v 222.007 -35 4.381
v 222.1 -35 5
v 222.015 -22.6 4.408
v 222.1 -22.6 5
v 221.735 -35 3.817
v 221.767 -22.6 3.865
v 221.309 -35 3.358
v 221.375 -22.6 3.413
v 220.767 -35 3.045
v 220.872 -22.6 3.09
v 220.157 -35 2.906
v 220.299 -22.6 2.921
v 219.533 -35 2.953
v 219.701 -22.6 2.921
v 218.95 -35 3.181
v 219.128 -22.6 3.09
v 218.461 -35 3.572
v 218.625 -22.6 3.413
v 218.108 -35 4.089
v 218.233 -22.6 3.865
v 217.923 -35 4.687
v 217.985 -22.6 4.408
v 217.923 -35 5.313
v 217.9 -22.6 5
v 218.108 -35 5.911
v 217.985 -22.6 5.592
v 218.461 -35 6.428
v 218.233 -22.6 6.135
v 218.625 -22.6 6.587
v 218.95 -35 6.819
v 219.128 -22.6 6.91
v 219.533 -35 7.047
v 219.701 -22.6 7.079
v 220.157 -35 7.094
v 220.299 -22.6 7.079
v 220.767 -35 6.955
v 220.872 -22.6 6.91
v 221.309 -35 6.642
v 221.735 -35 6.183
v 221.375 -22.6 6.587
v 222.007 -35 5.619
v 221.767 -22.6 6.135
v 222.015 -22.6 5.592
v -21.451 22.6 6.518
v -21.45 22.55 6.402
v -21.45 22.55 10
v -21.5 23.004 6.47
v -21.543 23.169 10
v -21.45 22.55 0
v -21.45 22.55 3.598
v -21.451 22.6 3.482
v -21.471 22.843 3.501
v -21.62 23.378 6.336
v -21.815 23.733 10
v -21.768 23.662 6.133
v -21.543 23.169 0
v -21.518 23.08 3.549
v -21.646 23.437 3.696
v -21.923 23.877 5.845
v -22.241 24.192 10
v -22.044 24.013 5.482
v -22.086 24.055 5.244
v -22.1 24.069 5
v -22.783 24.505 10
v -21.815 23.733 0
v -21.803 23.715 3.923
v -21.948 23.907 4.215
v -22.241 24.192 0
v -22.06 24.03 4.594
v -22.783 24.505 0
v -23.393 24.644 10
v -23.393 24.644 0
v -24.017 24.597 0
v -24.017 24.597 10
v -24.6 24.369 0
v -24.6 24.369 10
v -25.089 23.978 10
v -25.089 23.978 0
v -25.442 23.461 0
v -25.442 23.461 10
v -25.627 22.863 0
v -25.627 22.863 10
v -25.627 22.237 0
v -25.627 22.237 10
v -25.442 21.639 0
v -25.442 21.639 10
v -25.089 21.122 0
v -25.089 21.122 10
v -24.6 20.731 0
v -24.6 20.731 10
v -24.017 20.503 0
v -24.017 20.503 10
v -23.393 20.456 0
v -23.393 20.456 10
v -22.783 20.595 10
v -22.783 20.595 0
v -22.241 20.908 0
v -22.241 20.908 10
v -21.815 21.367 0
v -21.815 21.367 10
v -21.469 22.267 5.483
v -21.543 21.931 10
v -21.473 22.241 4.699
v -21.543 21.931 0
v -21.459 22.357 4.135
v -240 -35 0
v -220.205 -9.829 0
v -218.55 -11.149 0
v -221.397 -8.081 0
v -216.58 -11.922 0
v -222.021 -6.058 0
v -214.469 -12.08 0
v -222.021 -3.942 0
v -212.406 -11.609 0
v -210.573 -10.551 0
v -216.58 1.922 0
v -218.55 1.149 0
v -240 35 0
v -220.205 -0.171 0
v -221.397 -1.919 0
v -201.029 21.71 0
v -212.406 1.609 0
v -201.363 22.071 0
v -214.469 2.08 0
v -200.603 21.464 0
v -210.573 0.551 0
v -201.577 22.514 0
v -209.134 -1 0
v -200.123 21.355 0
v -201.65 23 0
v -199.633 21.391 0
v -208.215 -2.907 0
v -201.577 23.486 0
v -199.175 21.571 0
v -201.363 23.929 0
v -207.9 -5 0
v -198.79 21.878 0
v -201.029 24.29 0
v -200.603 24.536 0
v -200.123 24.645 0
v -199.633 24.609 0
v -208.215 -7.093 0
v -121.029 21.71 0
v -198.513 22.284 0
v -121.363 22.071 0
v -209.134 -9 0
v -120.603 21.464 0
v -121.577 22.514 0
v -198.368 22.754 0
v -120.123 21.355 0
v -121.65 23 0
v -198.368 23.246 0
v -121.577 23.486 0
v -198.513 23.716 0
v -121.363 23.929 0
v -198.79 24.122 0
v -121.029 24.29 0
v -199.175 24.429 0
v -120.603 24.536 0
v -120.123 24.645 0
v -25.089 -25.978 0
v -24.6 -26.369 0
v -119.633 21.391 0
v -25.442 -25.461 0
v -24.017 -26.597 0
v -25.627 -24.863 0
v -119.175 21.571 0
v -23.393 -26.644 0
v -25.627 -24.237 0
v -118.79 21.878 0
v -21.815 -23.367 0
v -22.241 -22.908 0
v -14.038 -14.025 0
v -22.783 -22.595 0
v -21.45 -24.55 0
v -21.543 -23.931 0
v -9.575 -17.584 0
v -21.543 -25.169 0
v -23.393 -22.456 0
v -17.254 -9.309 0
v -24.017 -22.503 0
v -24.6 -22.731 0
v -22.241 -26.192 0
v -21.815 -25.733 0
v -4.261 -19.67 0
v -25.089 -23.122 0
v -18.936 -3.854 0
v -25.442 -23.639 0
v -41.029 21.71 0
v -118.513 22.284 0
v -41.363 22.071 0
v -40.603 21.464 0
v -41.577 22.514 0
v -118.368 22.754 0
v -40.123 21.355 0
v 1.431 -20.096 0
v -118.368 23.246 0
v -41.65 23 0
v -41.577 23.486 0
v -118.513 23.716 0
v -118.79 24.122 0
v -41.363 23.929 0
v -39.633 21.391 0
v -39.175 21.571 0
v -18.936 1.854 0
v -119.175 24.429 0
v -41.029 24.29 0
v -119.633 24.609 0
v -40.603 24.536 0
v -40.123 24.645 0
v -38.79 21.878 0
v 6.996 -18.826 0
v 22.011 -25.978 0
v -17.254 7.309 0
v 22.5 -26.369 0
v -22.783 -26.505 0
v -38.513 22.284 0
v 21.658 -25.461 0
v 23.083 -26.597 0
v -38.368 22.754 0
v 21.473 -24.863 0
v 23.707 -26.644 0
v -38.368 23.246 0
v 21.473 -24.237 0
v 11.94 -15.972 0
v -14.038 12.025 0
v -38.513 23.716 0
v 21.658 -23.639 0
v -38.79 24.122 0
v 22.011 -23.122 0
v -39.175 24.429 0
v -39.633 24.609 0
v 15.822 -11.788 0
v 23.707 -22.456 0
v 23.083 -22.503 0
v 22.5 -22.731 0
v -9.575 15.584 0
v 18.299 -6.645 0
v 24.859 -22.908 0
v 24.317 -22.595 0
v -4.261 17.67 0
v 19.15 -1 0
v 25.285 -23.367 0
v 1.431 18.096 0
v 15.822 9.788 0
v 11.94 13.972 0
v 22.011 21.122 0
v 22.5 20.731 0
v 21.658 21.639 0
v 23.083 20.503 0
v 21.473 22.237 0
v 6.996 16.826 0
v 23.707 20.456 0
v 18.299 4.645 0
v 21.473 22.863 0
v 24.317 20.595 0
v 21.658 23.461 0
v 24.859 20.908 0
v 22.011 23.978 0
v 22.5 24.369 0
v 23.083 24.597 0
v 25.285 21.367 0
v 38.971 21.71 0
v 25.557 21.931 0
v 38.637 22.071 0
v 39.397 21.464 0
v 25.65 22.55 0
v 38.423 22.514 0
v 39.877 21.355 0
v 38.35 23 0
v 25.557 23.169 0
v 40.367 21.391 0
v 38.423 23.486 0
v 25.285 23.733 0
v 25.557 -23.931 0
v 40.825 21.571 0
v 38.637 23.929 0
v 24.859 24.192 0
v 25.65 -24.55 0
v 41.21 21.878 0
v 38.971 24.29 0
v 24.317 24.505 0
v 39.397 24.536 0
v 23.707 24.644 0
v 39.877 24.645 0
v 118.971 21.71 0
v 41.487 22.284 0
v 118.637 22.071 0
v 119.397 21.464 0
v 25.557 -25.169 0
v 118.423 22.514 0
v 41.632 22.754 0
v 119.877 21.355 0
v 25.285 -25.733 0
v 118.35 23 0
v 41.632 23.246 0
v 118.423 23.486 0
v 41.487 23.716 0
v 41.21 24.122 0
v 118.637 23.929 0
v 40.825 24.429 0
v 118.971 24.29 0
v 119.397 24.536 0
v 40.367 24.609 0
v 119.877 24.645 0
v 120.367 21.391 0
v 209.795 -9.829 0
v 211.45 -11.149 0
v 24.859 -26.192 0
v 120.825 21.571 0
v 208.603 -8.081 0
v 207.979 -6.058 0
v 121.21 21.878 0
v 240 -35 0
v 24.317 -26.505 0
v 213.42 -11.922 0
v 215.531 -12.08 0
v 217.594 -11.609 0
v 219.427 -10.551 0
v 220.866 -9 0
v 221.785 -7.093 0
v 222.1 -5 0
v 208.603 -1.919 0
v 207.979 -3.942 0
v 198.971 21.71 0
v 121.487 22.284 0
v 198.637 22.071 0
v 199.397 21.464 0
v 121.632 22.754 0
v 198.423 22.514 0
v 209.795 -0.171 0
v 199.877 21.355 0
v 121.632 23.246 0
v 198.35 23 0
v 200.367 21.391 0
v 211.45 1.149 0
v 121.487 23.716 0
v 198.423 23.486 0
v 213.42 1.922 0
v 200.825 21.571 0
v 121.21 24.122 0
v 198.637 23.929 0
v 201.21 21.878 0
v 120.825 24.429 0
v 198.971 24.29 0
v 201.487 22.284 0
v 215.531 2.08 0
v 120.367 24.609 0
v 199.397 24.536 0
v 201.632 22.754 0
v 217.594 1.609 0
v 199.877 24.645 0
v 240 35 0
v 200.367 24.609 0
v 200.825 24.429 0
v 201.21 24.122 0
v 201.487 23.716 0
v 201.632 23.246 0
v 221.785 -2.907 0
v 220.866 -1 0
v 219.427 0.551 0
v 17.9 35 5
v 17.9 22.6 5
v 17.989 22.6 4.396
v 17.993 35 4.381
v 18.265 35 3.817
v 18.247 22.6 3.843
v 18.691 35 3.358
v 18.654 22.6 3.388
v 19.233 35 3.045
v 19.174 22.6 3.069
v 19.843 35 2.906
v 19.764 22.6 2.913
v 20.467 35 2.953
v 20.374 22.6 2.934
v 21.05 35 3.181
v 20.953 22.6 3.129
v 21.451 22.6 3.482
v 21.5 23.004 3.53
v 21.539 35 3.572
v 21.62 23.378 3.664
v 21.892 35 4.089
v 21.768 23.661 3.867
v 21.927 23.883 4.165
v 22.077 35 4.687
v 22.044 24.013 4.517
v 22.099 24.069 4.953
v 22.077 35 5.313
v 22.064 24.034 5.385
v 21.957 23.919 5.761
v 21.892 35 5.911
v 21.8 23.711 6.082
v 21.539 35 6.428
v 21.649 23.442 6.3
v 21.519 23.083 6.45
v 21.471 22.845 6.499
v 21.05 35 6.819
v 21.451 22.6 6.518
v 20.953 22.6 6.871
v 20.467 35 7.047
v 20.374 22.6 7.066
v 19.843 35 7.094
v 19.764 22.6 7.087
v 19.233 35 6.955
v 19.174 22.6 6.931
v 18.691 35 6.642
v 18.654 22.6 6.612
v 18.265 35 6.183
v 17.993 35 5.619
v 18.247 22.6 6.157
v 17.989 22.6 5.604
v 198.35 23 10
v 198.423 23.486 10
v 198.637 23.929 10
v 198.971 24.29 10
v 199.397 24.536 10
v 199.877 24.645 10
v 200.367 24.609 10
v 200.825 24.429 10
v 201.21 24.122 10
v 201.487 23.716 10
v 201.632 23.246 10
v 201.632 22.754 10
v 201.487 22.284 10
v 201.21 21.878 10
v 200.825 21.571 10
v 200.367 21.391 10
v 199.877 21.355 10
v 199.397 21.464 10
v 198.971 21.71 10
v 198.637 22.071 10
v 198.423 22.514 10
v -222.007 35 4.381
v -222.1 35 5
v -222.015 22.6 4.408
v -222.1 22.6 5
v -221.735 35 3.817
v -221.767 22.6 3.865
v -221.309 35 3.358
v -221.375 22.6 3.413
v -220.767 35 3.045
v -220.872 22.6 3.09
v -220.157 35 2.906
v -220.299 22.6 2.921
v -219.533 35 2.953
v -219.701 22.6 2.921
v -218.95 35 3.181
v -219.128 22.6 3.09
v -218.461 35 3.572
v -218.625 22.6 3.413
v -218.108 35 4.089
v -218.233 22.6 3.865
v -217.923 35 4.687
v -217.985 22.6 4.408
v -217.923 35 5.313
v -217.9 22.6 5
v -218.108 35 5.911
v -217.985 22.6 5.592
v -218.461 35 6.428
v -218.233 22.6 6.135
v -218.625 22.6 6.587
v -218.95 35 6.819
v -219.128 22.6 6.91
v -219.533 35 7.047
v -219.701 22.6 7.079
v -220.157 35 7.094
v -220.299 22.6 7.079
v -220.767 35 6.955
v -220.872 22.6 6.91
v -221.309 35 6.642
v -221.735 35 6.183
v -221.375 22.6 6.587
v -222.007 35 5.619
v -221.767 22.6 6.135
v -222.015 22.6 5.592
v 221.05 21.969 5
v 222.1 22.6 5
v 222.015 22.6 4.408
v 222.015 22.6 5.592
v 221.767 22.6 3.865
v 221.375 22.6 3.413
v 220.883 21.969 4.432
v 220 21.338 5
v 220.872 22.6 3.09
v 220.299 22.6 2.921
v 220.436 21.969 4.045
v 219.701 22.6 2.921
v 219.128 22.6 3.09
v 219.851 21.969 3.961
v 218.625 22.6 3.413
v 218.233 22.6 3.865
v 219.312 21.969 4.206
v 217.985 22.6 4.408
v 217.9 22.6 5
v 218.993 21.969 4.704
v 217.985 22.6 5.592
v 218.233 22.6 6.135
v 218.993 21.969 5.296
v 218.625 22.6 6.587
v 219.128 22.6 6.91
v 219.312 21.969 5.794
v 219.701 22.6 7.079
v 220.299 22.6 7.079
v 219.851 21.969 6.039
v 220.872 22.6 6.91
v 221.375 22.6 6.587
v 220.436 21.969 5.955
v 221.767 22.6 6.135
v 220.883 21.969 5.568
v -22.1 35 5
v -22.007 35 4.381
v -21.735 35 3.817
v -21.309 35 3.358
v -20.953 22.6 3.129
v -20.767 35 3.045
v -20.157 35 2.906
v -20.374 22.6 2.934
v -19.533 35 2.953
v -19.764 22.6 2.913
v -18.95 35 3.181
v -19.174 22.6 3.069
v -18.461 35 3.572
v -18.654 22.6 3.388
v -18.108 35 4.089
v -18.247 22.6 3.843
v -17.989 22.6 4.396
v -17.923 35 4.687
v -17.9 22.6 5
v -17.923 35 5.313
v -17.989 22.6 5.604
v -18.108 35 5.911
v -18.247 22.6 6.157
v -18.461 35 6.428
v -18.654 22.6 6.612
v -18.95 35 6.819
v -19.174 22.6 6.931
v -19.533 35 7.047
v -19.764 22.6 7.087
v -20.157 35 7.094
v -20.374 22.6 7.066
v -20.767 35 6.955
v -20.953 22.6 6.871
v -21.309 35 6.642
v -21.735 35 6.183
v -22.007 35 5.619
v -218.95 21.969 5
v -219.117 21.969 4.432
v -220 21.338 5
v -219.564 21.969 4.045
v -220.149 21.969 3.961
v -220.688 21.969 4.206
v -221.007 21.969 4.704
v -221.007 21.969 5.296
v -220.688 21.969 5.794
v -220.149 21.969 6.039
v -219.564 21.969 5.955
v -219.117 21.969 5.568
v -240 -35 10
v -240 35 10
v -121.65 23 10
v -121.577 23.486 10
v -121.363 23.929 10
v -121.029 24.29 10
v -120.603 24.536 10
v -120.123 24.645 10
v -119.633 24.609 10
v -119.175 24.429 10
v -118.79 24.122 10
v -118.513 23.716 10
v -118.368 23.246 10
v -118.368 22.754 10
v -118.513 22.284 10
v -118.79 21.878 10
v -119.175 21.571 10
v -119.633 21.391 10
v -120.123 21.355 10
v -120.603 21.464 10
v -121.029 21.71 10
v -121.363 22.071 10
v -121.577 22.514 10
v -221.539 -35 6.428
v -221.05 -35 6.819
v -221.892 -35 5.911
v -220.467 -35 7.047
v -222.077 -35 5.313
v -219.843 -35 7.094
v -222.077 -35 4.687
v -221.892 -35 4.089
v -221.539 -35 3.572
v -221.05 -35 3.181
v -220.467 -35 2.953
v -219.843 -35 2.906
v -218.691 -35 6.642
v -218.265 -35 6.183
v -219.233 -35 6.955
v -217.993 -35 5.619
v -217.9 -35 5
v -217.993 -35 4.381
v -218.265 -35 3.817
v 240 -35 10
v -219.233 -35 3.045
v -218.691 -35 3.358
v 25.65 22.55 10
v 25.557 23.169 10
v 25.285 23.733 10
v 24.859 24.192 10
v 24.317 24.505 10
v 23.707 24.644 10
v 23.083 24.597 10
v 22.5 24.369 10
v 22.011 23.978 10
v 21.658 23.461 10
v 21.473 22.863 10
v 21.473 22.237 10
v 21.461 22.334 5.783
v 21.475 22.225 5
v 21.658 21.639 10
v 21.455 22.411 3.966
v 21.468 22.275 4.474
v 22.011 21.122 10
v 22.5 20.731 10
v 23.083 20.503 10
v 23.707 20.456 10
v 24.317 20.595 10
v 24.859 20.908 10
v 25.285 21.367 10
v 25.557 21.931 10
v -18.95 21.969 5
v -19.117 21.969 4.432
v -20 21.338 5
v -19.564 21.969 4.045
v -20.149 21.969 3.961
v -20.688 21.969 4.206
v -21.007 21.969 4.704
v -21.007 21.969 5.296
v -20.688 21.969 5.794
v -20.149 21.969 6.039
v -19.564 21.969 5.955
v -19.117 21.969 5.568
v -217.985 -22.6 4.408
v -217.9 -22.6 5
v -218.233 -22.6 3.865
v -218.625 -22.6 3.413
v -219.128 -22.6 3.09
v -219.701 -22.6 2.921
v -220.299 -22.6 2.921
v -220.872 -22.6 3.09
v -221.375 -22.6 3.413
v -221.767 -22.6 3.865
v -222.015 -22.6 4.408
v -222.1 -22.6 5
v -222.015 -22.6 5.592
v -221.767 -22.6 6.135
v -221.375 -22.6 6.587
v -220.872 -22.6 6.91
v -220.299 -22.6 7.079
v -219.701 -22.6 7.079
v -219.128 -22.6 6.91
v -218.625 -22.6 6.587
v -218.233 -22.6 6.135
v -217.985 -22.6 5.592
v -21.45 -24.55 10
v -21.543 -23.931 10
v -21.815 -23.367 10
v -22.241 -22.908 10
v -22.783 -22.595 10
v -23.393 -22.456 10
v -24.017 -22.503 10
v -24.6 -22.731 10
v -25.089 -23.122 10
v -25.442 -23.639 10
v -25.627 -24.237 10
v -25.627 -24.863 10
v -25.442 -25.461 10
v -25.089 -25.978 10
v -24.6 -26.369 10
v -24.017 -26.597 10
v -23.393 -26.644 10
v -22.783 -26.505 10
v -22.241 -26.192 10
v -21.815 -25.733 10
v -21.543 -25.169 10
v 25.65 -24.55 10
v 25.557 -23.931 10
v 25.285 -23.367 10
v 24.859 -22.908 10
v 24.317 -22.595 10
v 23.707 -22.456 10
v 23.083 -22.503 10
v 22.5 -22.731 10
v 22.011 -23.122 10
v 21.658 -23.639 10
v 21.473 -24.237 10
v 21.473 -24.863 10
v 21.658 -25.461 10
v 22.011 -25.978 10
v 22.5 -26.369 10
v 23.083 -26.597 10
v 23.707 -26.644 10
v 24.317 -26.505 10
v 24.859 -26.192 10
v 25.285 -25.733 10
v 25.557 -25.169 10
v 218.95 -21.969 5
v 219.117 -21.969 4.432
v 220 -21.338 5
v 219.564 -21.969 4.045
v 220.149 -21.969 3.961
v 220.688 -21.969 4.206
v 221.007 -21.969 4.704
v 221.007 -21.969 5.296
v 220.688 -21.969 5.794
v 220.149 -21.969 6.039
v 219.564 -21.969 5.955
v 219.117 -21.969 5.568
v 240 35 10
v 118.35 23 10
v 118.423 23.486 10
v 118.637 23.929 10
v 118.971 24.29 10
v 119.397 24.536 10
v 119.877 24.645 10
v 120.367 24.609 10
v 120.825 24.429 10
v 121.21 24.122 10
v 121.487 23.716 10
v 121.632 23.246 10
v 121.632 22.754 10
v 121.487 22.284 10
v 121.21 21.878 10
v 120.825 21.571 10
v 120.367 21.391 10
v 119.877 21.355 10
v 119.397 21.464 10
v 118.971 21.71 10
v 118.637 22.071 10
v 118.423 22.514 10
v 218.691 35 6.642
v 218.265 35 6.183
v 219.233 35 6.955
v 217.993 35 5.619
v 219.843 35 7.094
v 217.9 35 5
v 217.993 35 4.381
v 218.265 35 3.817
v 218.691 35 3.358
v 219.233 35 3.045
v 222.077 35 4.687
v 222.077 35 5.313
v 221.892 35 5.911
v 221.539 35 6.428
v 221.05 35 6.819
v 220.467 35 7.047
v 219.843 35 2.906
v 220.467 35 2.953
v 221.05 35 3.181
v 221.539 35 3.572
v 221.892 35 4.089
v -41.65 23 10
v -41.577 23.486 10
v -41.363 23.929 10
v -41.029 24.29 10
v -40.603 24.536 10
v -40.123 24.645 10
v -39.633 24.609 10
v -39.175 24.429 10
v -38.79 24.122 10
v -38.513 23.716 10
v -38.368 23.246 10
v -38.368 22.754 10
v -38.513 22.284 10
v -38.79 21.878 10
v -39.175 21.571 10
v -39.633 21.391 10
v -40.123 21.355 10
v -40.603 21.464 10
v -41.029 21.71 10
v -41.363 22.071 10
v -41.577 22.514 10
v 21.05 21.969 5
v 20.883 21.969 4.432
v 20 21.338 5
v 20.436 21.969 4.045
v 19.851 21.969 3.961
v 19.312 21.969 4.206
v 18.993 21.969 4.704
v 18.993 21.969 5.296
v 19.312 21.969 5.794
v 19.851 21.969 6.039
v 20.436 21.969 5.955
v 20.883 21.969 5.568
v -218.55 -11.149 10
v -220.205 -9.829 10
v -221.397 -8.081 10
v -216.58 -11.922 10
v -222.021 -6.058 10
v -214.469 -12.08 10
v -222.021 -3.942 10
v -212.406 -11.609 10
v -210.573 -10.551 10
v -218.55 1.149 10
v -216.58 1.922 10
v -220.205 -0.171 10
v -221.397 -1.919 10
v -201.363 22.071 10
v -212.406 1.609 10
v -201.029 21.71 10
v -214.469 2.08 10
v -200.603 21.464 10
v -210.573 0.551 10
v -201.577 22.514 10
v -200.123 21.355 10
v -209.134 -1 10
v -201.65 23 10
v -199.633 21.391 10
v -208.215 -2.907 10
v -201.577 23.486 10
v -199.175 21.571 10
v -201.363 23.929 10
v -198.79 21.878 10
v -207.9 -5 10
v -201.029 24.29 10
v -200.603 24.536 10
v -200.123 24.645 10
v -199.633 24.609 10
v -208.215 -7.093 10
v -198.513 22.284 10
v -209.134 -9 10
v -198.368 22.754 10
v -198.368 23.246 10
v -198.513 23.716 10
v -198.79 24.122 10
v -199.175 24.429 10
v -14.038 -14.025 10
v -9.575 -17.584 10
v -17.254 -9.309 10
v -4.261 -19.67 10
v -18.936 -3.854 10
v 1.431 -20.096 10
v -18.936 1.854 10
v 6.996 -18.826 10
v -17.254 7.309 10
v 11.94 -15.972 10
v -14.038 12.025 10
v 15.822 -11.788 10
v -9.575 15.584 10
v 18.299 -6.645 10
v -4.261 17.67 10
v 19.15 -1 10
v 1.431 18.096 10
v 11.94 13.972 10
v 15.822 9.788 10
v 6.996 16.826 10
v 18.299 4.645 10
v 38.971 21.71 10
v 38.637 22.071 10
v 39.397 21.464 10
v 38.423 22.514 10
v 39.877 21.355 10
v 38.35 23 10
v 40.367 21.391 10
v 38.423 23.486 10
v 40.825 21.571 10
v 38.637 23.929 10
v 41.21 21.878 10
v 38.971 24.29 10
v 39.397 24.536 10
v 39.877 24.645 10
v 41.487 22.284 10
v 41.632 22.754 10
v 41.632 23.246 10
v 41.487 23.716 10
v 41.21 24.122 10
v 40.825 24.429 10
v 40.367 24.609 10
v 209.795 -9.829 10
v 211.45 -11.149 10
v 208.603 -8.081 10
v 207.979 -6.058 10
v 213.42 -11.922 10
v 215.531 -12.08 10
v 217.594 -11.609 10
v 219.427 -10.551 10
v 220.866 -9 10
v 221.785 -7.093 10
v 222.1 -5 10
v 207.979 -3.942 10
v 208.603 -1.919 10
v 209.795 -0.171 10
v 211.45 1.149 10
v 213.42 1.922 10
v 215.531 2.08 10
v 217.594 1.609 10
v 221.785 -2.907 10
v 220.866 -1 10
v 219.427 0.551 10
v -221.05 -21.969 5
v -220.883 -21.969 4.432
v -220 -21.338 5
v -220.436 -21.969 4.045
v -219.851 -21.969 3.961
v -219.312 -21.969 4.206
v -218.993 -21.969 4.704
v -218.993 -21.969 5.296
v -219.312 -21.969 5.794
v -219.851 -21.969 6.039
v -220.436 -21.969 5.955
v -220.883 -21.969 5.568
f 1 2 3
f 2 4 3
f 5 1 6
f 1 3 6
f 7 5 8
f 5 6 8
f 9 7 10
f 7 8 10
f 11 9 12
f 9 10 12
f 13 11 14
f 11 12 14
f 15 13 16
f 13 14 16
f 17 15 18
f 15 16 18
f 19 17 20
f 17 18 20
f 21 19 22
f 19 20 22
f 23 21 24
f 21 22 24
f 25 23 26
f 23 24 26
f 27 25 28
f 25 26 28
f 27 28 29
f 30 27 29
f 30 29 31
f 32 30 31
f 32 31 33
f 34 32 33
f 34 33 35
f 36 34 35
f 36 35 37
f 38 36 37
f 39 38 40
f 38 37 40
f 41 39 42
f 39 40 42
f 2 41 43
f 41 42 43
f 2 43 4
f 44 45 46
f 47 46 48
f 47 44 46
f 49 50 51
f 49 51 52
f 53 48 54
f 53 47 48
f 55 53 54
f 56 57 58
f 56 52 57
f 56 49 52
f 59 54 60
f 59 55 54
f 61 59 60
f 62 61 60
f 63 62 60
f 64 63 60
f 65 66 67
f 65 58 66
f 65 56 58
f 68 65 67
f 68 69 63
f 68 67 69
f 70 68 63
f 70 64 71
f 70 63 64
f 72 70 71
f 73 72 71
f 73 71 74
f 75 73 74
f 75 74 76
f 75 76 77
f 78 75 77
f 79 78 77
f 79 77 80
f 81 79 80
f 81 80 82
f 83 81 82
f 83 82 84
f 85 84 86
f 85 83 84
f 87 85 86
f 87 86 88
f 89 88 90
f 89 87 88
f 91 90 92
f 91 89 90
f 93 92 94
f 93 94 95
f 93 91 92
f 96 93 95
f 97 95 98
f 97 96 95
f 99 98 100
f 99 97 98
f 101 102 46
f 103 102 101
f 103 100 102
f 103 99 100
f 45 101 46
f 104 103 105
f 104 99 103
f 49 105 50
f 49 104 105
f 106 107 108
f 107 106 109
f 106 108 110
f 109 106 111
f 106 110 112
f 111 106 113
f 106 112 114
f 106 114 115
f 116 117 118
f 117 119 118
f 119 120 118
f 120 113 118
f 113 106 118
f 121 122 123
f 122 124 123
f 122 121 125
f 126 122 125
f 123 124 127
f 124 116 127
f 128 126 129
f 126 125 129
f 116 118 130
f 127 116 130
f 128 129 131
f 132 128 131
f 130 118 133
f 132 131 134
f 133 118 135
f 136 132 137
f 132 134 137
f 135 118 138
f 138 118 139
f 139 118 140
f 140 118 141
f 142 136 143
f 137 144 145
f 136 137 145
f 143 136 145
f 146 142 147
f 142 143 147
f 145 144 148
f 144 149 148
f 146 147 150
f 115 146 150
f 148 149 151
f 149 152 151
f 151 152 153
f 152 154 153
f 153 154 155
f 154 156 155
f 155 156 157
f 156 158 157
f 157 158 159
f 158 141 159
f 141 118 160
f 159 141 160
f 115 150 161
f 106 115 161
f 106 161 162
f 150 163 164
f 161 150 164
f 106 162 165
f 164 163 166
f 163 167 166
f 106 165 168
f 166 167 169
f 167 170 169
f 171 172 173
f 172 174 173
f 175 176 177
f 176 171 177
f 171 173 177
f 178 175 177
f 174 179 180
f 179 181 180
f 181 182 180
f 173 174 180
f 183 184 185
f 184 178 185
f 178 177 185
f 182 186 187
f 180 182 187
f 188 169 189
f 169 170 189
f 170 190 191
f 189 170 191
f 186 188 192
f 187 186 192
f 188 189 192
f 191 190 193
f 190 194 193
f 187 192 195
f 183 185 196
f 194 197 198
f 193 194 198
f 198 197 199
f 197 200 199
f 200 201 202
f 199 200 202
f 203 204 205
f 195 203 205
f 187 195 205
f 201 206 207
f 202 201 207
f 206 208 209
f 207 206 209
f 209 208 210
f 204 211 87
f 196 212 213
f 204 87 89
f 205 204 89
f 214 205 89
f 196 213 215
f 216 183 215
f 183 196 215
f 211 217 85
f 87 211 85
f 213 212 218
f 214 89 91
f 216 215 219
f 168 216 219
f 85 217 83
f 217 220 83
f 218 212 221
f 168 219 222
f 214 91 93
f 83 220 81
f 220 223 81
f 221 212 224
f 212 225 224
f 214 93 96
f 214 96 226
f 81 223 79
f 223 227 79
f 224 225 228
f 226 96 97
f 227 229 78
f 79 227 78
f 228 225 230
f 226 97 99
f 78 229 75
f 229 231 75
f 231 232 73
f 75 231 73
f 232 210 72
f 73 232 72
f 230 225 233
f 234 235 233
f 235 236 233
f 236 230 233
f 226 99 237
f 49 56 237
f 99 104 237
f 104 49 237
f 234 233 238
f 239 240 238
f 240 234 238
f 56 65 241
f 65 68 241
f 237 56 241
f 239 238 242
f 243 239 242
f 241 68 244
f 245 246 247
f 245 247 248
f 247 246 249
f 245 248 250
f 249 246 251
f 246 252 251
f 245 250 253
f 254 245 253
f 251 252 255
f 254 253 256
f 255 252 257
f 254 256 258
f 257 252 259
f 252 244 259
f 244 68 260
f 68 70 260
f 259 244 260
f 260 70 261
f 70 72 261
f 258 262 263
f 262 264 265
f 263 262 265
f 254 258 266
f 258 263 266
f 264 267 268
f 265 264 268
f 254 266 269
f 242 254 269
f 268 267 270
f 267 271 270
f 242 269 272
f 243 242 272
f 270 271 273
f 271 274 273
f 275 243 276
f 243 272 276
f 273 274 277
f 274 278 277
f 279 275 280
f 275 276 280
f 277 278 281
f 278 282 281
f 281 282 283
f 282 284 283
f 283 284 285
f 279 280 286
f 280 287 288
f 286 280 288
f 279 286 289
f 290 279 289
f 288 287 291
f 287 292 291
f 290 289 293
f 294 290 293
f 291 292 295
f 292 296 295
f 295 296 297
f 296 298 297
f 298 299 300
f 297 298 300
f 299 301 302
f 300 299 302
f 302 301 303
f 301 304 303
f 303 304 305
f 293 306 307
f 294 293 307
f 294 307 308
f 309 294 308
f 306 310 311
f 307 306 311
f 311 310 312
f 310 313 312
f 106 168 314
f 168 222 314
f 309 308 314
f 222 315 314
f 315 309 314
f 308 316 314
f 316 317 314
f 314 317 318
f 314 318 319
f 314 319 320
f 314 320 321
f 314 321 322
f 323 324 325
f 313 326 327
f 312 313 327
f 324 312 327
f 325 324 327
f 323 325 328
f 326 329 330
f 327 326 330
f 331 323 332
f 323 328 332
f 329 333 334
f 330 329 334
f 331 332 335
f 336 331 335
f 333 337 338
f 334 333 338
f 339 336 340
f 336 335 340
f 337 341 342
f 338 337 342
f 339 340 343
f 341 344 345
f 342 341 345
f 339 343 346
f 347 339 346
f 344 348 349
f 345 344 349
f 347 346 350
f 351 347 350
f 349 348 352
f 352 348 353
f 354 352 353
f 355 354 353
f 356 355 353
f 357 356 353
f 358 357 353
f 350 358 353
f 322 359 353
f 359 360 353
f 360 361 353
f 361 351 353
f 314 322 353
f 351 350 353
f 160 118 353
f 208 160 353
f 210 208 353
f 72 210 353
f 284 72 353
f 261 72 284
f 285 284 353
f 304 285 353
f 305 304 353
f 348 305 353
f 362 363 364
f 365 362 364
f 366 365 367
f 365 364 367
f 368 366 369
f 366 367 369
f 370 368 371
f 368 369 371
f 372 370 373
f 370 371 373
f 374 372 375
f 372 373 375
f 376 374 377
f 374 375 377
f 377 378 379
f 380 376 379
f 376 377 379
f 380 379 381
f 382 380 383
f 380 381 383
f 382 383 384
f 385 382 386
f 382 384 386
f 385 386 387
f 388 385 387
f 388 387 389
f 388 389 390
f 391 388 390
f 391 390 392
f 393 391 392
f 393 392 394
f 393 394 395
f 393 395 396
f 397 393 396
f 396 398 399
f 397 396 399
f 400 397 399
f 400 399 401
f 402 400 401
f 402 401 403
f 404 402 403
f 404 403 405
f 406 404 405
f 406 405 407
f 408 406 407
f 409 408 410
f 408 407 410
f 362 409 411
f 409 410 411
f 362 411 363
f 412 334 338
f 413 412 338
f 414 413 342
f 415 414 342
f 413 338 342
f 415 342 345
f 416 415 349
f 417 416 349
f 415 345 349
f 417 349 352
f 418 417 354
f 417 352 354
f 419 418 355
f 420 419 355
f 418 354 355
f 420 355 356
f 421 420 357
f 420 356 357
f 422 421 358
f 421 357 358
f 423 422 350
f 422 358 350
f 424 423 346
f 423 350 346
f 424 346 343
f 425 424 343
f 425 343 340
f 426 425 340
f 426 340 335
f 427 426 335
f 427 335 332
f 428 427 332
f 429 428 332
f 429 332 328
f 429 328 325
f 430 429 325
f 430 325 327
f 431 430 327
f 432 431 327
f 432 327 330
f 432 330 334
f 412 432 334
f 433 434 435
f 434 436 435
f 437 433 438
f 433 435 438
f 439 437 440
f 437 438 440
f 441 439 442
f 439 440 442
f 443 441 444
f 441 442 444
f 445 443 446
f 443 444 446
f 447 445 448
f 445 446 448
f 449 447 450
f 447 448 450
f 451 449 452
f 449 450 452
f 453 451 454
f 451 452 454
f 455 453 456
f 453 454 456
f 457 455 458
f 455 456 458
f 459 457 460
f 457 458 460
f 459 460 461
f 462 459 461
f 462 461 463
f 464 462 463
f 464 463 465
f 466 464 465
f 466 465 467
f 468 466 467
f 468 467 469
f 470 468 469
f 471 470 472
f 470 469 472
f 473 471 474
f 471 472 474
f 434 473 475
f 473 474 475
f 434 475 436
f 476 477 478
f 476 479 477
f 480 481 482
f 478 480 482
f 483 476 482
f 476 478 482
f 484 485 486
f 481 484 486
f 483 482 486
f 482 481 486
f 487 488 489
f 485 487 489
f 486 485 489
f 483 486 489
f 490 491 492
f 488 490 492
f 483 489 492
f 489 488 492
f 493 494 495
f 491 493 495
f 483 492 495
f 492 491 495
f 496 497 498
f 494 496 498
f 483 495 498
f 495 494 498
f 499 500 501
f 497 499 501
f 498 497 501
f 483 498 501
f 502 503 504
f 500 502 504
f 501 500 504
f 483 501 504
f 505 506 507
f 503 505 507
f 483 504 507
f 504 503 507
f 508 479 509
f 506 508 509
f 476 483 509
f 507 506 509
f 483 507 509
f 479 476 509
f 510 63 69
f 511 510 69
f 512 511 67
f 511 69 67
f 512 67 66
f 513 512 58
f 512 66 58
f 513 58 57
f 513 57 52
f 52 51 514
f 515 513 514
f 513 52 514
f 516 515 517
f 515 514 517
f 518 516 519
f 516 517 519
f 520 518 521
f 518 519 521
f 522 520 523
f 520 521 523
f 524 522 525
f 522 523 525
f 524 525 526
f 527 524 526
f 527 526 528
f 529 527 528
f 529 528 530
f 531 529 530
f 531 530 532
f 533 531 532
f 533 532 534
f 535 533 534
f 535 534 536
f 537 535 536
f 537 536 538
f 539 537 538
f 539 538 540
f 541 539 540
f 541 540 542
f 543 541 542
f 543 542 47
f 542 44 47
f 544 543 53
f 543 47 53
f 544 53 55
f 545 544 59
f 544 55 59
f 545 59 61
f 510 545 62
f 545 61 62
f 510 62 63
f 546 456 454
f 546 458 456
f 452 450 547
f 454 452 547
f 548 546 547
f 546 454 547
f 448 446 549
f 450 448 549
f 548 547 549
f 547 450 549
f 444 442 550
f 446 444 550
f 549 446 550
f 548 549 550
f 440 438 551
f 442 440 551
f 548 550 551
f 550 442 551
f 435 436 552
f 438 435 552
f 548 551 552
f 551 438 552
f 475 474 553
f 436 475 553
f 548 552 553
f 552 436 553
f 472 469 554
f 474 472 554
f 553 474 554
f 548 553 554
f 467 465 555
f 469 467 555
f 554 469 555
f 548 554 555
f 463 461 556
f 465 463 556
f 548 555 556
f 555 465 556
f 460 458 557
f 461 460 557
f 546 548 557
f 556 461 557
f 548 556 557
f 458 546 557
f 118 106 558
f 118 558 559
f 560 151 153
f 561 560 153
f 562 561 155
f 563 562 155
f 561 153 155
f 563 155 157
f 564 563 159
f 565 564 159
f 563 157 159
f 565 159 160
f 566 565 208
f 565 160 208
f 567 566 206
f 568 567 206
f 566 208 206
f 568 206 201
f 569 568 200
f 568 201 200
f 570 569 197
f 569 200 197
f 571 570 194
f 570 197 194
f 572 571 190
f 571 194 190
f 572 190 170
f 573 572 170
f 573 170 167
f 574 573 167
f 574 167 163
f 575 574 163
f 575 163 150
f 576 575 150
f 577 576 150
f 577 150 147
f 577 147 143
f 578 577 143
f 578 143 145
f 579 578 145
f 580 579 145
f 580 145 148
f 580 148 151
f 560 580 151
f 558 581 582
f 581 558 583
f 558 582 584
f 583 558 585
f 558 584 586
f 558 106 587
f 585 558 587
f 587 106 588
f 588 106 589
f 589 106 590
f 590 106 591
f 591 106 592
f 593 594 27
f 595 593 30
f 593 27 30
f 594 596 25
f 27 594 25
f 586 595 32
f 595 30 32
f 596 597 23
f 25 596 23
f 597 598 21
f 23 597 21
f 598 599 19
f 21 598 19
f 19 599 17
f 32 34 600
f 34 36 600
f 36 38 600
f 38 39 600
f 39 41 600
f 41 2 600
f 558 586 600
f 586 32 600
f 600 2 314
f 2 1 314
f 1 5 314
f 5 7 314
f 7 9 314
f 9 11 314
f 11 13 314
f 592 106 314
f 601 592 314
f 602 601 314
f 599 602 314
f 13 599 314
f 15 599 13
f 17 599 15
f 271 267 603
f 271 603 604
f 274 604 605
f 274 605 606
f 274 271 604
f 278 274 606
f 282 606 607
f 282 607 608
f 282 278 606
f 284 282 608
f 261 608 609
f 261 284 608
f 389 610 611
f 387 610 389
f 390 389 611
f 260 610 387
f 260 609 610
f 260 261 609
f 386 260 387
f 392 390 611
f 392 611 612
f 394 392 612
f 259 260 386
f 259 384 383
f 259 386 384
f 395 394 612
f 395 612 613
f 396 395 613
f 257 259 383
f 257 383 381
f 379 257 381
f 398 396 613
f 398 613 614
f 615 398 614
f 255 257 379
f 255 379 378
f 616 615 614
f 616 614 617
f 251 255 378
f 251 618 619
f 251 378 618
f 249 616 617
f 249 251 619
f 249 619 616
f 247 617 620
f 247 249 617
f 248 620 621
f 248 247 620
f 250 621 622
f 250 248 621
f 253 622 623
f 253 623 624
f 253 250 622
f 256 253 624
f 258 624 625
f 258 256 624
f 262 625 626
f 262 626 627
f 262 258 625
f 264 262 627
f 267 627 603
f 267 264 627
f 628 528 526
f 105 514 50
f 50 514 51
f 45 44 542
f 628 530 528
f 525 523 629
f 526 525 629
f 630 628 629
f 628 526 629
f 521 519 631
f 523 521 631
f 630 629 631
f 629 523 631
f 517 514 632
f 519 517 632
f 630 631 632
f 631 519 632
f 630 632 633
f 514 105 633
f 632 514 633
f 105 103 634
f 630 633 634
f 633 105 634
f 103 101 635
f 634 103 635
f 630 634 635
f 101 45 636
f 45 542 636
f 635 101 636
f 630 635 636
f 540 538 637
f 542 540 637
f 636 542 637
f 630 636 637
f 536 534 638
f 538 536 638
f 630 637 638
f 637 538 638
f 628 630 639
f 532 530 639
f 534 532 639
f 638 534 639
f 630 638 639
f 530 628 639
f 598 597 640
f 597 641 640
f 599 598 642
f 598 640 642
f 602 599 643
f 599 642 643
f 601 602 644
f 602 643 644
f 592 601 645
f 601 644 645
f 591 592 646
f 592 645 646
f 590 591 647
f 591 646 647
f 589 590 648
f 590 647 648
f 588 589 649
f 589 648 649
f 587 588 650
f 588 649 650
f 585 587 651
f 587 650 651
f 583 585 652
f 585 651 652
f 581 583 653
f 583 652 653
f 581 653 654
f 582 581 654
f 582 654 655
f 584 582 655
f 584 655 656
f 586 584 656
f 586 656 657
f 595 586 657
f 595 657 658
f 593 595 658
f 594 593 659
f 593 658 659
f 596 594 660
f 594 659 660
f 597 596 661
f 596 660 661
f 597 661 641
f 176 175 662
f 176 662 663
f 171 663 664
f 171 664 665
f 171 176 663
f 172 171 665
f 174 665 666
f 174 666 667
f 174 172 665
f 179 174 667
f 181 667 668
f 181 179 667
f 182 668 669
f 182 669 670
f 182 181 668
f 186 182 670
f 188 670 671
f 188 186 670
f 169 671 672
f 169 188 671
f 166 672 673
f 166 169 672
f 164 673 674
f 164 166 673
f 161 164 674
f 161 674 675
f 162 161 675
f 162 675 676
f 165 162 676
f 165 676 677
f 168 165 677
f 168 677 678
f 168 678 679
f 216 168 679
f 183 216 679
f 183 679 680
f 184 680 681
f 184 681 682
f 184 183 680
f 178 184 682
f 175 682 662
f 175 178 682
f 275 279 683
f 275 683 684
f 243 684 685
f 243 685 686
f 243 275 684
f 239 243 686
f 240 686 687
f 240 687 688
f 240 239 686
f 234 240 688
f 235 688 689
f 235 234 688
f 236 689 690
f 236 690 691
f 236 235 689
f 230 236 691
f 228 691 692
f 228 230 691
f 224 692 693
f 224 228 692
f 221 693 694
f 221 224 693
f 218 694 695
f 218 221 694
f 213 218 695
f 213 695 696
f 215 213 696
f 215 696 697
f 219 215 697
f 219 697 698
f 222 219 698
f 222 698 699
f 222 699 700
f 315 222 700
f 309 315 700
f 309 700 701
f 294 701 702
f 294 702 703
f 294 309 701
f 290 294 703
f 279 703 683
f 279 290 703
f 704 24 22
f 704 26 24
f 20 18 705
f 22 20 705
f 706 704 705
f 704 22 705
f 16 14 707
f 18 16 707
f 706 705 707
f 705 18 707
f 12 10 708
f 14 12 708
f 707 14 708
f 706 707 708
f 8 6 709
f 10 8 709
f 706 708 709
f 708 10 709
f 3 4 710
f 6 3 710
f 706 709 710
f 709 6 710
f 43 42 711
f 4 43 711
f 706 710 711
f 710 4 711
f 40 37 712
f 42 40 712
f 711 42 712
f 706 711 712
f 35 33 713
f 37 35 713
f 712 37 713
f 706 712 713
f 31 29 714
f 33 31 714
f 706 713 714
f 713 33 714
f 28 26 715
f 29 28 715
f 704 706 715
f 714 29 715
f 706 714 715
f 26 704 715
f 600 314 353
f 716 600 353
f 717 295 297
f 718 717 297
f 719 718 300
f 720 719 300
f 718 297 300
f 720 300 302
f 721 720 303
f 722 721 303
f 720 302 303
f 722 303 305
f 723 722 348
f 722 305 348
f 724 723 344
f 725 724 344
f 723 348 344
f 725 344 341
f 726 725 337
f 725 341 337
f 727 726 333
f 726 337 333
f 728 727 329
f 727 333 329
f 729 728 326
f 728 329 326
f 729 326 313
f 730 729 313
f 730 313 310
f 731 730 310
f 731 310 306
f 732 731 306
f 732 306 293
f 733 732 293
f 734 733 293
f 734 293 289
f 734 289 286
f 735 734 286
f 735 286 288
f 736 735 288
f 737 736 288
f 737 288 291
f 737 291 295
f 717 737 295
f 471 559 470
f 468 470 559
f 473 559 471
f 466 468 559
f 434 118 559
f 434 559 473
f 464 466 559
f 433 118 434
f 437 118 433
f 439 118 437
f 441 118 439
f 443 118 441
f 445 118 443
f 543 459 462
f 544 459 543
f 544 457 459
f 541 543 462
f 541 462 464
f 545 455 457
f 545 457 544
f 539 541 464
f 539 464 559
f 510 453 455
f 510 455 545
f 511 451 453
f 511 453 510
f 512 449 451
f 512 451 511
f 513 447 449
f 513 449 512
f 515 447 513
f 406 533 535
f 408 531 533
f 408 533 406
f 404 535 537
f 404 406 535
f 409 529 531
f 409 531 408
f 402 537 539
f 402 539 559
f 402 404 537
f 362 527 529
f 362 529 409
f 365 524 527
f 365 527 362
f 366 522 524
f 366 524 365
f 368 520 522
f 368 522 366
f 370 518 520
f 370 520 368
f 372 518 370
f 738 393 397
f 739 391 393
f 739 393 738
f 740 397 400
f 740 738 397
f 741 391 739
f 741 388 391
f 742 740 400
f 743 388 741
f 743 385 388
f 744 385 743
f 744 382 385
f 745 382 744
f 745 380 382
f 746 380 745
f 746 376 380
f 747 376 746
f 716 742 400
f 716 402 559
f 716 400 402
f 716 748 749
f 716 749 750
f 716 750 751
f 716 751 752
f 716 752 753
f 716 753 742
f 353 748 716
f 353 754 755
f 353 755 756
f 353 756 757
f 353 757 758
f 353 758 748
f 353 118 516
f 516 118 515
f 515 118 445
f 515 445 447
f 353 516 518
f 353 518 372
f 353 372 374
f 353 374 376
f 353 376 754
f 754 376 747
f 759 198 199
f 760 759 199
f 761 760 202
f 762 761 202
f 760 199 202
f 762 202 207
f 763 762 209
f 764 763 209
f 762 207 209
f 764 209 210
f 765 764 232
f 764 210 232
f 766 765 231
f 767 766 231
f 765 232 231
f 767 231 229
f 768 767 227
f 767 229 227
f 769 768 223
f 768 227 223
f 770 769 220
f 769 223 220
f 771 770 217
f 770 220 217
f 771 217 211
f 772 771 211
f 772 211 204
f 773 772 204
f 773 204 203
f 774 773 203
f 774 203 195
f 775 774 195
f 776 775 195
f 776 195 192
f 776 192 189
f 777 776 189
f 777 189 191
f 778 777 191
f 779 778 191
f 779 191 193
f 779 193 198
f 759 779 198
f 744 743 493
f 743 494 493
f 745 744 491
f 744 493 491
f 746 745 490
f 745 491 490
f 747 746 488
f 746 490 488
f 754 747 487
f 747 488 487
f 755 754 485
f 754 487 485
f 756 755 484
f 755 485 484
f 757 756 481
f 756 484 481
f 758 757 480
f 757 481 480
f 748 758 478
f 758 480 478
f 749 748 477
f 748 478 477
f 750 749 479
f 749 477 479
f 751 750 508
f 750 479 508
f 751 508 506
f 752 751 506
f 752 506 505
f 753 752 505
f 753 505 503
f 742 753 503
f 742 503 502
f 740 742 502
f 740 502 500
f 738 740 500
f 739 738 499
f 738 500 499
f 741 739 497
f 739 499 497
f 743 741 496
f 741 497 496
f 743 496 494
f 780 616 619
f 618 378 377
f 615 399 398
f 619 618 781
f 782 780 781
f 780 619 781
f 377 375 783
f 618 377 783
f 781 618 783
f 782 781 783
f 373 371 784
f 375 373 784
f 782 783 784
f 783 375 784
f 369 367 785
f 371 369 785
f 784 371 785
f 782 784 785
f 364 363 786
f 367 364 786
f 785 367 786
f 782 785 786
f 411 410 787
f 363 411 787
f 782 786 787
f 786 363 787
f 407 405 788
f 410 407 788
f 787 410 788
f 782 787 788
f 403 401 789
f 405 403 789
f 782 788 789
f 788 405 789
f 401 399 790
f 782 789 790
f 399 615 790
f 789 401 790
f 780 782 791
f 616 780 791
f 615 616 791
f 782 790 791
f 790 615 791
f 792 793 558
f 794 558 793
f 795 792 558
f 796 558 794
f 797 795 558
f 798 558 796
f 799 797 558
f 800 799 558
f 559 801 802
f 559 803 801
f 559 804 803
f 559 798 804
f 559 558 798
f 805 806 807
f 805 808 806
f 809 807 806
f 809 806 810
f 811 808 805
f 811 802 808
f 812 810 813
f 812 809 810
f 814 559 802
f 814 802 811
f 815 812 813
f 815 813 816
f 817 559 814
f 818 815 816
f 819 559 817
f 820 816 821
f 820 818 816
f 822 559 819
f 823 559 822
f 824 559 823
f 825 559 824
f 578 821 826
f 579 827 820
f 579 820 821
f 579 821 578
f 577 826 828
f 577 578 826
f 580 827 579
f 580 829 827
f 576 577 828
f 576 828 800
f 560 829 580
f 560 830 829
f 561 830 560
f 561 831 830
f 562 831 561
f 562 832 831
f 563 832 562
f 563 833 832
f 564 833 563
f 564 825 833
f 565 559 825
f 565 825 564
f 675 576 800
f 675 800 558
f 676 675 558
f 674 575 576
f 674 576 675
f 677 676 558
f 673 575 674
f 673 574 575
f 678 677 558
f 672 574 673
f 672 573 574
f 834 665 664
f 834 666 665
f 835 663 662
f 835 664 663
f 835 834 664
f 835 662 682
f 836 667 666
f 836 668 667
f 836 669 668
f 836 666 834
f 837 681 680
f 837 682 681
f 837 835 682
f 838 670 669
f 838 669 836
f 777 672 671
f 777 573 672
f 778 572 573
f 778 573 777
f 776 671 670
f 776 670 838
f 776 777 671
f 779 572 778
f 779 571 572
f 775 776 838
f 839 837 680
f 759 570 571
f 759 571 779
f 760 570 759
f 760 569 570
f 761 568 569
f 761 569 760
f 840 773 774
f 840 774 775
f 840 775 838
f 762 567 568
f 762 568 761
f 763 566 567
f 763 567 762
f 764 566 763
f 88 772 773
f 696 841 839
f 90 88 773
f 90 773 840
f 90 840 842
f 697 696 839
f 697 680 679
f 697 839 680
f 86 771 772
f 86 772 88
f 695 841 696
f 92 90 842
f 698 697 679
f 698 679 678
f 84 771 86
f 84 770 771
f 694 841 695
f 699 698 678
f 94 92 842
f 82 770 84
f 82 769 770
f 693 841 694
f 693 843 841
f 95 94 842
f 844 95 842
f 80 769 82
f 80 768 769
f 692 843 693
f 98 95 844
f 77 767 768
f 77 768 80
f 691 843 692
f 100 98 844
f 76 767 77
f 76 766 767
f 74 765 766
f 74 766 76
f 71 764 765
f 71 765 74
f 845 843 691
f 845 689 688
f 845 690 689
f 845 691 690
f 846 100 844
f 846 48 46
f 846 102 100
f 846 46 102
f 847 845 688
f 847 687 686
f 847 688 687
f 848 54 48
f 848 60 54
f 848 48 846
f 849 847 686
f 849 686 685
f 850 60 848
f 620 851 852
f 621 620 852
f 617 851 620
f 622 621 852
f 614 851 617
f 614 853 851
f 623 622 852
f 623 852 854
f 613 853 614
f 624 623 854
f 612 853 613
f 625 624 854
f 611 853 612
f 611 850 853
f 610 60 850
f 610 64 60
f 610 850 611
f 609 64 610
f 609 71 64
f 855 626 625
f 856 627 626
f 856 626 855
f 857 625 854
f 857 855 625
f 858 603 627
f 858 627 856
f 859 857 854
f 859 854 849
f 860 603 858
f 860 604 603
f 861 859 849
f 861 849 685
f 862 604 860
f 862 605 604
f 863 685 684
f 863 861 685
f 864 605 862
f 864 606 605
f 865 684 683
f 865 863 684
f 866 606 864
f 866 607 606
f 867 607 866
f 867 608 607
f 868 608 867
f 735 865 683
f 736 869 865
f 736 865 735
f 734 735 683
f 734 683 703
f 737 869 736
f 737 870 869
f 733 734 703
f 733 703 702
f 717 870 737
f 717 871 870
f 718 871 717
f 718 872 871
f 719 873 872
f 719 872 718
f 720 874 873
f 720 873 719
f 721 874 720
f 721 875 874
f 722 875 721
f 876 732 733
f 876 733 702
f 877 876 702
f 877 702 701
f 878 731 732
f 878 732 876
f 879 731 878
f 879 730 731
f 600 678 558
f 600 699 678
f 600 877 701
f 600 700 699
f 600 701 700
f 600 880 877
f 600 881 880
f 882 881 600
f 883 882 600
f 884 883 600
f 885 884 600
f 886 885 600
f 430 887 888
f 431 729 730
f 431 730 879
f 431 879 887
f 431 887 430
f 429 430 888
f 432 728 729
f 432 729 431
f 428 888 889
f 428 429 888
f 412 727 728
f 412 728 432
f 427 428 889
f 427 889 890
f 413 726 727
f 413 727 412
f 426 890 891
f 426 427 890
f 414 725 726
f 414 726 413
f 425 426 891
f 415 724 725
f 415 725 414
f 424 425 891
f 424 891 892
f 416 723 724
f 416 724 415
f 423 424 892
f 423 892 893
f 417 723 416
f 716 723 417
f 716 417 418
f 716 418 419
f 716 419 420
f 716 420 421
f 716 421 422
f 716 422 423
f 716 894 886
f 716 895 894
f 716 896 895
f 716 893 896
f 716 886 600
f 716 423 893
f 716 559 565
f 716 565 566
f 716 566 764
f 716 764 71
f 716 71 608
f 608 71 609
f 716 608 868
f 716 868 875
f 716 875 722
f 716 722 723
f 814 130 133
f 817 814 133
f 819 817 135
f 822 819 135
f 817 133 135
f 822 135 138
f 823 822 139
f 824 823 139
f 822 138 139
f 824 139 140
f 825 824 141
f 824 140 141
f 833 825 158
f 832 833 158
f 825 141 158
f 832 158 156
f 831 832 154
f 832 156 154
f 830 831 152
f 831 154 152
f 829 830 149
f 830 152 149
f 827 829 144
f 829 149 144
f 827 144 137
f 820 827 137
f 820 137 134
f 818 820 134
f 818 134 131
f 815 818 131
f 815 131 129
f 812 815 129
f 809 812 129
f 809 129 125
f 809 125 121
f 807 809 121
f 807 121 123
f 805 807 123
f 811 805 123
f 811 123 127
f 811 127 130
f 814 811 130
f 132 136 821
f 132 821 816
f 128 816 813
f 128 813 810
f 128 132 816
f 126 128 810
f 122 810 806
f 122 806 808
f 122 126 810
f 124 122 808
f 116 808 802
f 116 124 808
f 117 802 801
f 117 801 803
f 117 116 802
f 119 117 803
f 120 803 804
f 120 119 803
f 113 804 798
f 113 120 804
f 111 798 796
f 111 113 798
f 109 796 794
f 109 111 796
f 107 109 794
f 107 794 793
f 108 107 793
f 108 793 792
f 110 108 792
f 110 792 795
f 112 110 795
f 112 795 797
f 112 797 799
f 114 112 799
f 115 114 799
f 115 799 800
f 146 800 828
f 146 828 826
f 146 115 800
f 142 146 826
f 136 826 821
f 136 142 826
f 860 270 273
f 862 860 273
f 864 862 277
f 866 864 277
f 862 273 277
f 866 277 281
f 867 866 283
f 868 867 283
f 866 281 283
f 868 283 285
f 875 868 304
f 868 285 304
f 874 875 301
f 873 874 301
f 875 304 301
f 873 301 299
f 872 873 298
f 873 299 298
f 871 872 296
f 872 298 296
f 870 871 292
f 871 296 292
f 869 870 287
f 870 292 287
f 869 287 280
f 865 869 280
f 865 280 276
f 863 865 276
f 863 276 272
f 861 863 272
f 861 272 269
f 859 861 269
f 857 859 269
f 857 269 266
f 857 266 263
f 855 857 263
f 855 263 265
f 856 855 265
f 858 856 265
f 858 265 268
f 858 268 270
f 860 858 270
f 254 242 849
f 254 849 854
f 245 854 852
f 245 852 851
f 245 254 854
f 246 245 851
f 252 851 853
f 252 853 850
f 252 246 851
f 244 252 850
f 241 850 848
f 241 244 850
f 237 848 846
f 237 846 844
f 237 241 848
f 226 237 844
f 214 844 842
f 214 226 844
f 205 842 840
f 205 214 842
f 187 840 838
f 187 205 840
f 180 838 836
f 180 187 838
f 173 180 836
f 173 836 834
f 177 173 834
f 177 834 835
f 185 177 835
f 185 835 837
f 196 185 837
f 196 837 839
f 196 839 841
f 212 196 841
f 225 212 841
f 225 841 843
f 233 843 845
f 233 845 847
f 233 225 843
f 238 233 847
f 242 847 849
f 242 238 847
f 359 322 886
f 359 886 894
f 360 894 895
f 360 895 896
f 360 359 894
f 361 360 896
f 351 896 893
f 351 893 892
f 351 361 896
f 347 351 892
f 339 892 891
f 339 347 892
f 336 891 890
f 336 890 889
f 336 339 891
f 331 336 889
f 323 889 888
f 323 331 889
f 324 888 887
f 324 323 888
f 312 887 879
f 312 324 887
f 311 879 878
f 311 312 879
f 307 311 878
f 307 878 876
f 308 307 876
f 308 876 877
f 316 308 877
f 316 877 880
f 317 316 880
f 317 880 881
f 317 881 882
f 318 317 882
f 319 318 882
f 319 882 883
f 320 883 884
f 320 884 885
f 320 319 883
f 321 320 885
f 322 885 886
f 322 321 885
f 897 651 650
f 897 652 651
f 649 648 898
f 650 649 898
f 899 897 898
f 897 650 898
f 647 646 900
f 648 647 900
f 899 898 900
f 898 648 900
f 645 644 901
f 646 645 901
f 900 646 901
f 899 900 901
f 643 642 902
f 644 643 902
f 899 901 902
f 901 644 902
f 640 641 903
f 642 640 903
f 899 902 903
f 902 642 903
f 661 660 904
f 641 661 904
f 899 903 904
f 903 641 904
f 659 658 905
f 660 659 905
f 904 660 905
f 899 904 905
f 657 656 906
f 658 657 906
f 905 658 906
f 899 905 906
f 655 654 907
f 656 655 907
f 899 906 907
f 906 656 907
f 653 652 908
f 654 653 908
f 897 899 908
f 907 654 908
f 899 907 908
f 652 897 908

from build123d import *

# Parameters (mm, degrees)
SKETCH1_W                  = 480
SKETCH1_H                  = 70
SKETCH1_R                  = 19.15
SKETCH1_R_2                = 2.1
SKETCH1_R_3                = 7.1
BOSS_EXTRUDE1_DEPTH        = 10
M5_TAPPED_HOLE1_D          = 4.2
M5_TAPPED_HOLE1_DEPTH      = 12.4
M5_TAPPED_HOLE1_TIP        = 1.2618073
M5_TAPPED_HOLE2_D          = 4.2
M5_TAPPED_HOLE2_DEPTH      = 12.4
M5_TAPPED_HOLE2_TIP        = 1.2618073
F_3_3_3_3_DIAMETER_HOLE1_D = 3.3


with BuildPart() as part:
    # Sketch1 → Boss-Extrude1 (new body)
    with BuildSketch(Plane.XY):
        Rectangle(SKETCH1_W, SKETCH1_H)
        with Locations((0, -1)):
            Circle(SKETCH1_R, mode=Mode.SUBTRACT)
        with Locations((-23.55, -24.55)):
            Circle(SKETCH1_R_2, mode=Mode.SUBTRACT)
        with Locations((23.55, -24.55)):
            Circle(SKETCH1_R_2, mode=Mode.SUBTRACT)
        with Locations((23.55, 22.55)):
            Circle(SKETCH1_R_2, mode=Mode.SUBTRACT)
        with Locations((-23.55, 22.55)):
            Circle(SKETCH1_R_2, mode=Mode.SUBTRACT)
        with Locations((-215, -5)):
            Circle(SKETCH1_R_3, mode=Mode.SUBTRACT)
        with Locations((215, -5)):
            Circle(SKETCH1_R_3, mode=Mode.SUBTRACT)
    extrude(amount=BOSS_EXTRUDE1_DEPTH)

    # M5 Tapped Hole1
    with Locations(Plane(origin=(0, 35, 0), x_dir=(1, 0, 0), z_dir=(0, 1, 0))):
        with Locations((220, -5), (-220, -5), (-20, -5), (20, -5)):
            Hole(M5_TAPPED_HOLE1_D / 2, depth=M5_TAPPED_HOLE1_DEPTH)
            with Locations((0, 0, -(M5_TAPPED_HOLE1_DEPTH + M5_TAPPED_HOLE1_TIP / 2))):  # 118° drill point
                Cone(0, M5_TAPPED_HOLE1_D / 2, M5_TAPPED_HOLE1_TIP, mode=Mode.SUBTRACT)

    # M5 Tapped Hole2
    with Locations(Plane(origin=(0, -35, 0), x_dir=(-1, 0, 0), z_dir=(0, -1, 0))):
        with Locations((-220, -5), (220, -5)):
            Hole(M5_TAPPED_HOLE2_D / 2, depth=M5_TAPPED_HOLE2_DEPTH)
            with Locations((0, 0, -(M5_TAPPED_HOLE2_DEPTH + M5_TAPPED_HOLE2_TIP / 2))):  # 118° drill point
                Cone(0, M5_TAPPED_HOLE2_D / 2, M5_TAPPED_HOLE2_TIP, mode=Mode.SUBTRACT)

    # Ø3.3 (3.3) Diameter Hole1 (through all)
    with Locations(Plane.XY.offset(10)):
        with Locations((-200, 23), (-120, 23), (-40, 23), (40, 23), (120, 23), (200, 23)):
            Hole(F_3_3_3_3_DIAMETER_HOLE1_D / 2)


solid = part.part
